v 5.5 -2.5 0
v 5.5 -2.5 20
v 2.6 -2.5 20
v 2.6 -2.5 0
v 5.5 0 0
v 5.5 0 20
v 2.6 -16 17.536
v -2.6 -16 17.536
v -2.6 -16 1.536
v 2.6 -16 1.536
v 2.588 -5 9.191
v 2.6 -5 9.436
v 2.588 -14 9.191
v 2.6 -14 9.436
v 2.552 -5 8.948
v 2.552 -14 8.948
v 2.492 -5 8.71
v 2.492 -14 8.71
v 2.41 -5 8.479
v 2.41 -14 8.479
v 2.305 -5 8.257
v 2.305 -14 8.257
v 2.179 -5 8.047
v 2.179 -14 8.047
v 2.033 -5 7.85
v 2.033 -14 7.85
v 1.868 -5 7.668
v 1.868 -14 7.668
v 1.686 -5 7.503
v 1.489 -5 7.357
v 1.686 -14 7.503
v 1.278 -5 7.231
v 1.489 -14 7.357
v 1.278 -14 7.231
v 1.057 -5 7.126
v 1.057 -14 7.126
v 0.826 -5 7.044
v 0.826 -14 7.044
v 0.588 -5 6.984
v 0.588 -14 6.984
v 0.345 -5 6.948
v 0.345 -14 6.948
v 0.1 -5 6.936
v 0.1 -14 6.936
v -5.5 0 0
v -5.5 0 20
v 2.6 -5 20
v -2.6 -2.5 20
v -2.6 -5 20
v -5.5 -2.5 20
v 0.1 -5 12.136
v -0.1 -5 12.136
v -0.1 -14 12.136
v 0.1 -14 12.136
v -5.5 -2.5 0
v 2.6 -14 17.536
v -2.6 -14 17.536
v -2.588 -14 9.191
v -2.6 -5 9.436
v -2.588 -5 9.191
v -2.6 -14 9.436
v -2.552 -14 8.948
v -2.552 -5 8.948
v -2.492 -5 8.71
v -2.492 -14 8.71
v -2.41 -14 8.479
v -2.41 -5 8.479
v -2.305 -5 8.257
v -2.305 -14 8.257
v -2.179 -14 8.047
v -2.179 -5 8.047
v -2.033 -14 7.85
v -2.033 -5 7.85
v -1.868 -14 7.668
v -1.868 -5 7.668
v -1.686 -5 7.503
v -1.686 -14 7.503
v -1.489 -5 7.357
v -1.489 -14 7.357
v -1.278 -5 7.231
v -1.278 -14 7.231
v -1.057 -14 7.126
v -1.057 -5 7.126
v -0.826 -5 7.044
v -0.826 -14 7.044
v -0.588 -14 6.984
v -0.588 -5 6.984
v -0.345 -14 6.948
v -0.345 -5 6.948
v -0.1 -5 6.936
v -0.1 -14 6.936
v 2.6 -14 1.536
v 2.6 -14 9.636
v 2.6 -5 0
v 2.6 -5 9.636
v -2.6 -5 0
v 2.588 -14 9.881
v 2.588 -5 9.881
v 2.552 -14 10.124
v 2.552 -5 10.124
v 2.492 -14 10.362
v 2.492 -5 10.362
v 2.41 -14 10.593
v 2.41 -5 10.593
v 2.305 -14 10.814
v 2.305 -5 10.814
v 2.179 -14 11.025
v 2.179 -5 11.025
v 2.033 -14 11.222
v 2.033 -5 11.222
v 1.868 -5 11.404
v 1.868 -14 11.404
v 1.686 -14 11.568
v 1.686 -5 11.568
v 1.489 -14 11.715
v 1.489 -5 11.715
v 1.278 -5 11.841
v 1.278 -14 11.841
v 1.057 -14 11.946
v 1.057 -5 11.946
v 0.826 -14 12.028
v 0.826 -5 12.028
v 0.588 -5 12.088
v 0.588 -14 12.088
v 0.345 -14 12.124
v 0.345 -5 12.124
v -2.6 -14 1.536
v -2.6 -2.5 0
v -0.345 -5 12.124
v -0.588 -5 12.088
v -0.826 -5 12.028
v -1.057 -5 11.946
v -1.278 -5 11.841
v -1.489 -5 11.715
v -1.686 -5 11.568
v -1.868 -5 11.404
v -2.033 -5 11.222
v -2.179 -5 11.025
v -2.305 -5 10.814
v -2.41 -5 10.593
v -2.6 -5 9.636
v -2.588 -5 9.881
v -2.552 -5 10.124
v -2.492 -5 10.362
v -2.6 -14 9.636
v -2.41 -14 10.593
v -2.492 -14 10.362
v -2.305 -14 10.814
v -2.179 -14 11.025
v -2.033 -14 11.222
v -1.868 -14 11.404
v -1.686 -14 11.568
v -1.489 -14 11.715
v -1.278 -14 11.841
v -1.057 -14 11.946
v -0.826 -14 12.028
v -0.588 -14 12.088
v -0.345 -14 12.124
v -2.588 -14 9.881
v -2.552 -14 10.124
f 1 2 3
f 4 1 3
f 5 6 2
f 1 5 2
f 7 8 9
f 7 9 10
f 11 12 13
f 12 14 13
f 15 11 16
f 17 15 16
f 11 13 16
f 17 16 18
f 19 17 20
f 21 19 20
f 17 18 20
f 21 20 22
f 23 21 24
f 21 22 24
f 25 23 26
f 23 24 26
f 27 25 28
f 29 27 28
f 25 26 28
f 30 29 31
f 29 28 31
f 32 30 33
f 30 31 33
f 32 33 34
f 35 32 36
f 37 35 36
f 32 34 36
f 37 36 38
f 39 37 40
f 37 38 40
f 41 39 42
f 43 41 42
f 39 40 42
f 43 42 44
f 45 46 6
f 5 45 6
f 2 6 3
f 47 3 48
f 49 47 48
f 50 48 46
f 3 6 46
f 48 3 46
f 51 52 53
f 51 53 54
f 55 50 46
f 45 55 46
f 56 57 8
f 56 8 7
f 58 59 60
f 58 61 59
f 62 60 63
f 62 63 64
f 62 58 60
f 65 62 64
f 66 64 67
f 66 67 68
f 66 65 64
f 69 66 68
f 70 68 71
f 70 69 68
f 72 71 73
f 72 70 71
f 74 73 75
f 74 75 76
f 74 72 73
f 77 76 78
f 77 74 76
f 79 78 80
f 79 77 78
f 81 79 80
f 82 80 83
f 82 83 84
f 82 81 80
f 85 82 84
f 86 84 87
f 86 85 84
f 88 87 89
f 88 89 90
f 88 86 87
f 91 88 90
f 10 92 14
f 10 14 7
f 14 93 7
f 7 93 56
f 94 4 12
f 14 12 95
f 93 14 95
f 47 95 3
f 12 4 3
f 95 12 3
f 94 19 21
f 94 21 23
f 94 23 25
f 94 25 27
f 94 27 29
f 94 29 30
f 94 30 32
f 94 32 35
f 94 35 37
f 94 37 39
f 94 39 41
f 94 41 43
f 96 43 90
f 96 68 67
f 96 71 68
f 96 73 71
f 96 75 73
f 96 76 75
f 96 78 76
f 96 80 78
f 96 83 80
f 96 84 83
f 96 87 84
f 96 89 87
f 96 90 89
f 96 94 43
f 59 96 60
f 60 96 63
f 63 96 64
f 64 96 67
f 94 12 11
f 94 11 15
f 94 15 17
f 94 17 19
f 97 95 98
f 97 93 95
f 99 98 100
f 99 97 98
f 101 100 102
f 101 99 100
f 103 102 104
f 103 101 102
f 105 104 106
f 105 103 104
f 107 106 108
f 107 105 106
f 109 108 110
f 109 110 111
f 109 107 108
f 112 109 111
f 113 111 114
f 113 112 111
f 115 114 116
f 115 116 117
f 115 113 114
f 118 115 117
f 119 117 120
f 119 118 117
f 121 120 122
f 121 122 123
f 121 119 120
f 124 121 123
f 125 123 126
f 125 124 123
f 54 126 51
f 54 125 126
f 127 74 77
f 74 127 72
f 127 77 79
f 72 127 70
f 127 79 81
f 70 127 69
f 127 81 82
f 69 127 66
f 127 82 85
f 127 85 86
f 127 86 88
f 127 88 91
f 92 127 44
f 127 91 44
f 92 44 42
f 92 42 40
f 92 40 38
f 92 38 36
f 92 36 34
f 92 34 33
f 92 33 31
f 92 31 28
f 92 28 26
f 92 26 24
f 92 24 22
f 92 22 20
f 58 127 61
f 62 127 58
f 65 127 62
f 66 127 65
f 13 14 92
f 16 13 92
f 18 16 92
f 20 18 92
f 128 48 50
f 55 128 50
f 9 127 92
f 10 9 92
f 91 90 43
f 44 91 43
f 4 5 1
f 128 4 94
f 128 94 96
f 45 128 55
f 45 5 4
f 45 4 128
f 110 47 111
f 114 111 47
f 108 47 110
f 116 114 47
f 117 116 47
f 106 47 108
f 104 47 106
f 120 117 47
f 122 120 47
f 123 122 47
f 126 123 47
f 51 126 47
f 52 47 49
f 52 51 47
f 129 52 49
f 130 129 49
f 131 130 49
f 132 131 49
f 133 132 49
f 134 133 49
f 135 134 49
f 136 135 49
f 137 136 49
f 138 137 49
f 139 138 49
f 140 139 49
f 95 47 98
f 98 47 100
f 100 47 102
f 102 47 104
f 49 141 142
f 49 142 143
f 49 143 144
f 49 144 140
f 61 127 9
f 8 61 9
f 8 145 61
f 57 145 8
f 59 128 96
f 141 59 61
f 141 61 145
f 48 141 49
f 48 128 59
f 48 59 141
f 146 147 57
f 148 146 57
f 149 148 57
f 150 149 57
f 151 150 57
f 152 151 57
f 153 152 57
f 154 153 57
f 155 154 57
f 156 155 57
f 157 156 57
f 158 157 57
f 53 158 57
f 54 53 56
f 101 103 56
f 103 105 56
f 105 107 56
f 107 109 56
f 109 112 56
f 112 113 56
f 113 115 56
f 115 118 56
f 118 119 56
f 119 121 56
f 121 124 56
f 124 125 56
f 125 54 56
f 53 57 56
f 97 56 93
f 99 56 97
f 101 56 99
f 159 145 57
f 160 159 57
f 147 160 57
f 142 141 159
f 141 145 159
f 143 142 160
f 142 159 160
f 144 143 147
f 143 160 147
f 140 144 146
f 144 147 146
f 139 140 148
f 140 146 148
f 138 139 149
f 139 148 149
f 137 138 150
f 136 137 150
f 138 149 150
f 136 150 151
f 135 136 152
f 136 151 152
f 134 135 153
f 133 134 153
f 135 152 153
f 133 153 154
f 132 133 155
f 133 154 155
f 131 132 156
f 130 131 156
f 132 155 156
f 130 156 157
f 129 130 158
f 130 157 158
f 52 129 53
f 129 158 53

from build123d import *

# Parameters (mm, degrees)
SALIENTE_EXTRUIR1_DEPTH = 20
CROQUIS2_W              = 5.2
CROQUIS2_H              = 5.2
SALIENTE_EXTRUIR2_DEPTH = 9
CROQUIS3_W              = 5.2
CROQUIS3_H              = 16
SALIENTE_EXTRUIR4_DEPTH = 2
REDONDEO4_R             = 2.5


with BuildPart() as part:
    # Croquis1 → Saliente-Extruir1 (new body)
    with BuildSketch(Plane.XY):
        Polygon((-5.5, 0), (5.5, 0), (5.5, -2.5), (2.6, -2.5), (2.6, -5), (-2.6, -5), (-2.6, -2.5), (-5.5, -2.5), align=None)
    extrude(amount=SALIENTE_EXTRUIR1_DEPTH)

    # Croquis2 → Saliente-Extruir2 (add)
    with BuildSketch(Plane.XZ.offset(5)):
        with Locations((0, 9.535930778)):
            Rectangle(CROQUIS2_W, CROQUIS2_H)
    extrude(amount=SALIENTE_EXTRUIR2_DEPTH)

    # Croquis3 → Saliente-Extruir4 (add)
    with BuildSketch(Plane.XZ.offset(14)):
        with Locations((0, 9.535930778)):
            Rectangle(CROQUIS3_W, CROQUIS3_H)
    extrude(amount=SALIENTE_EXTRUIR4_DEPTH)

    # Redondeo4
    redondeo4_edges = [part.edges().sort_by_distance(p)[0] for p in [
        (-2.6, -9.5, 12.135930778),
        (-2.6, -9.5, 6.935930778),
        (2.6, -9.5, 6.935930778),
        (2.6, -9.5, 12.135930778),
    ]]
    fillet(redondeo4_edges, radius=REDONDEO4_R)


solid = part.part
